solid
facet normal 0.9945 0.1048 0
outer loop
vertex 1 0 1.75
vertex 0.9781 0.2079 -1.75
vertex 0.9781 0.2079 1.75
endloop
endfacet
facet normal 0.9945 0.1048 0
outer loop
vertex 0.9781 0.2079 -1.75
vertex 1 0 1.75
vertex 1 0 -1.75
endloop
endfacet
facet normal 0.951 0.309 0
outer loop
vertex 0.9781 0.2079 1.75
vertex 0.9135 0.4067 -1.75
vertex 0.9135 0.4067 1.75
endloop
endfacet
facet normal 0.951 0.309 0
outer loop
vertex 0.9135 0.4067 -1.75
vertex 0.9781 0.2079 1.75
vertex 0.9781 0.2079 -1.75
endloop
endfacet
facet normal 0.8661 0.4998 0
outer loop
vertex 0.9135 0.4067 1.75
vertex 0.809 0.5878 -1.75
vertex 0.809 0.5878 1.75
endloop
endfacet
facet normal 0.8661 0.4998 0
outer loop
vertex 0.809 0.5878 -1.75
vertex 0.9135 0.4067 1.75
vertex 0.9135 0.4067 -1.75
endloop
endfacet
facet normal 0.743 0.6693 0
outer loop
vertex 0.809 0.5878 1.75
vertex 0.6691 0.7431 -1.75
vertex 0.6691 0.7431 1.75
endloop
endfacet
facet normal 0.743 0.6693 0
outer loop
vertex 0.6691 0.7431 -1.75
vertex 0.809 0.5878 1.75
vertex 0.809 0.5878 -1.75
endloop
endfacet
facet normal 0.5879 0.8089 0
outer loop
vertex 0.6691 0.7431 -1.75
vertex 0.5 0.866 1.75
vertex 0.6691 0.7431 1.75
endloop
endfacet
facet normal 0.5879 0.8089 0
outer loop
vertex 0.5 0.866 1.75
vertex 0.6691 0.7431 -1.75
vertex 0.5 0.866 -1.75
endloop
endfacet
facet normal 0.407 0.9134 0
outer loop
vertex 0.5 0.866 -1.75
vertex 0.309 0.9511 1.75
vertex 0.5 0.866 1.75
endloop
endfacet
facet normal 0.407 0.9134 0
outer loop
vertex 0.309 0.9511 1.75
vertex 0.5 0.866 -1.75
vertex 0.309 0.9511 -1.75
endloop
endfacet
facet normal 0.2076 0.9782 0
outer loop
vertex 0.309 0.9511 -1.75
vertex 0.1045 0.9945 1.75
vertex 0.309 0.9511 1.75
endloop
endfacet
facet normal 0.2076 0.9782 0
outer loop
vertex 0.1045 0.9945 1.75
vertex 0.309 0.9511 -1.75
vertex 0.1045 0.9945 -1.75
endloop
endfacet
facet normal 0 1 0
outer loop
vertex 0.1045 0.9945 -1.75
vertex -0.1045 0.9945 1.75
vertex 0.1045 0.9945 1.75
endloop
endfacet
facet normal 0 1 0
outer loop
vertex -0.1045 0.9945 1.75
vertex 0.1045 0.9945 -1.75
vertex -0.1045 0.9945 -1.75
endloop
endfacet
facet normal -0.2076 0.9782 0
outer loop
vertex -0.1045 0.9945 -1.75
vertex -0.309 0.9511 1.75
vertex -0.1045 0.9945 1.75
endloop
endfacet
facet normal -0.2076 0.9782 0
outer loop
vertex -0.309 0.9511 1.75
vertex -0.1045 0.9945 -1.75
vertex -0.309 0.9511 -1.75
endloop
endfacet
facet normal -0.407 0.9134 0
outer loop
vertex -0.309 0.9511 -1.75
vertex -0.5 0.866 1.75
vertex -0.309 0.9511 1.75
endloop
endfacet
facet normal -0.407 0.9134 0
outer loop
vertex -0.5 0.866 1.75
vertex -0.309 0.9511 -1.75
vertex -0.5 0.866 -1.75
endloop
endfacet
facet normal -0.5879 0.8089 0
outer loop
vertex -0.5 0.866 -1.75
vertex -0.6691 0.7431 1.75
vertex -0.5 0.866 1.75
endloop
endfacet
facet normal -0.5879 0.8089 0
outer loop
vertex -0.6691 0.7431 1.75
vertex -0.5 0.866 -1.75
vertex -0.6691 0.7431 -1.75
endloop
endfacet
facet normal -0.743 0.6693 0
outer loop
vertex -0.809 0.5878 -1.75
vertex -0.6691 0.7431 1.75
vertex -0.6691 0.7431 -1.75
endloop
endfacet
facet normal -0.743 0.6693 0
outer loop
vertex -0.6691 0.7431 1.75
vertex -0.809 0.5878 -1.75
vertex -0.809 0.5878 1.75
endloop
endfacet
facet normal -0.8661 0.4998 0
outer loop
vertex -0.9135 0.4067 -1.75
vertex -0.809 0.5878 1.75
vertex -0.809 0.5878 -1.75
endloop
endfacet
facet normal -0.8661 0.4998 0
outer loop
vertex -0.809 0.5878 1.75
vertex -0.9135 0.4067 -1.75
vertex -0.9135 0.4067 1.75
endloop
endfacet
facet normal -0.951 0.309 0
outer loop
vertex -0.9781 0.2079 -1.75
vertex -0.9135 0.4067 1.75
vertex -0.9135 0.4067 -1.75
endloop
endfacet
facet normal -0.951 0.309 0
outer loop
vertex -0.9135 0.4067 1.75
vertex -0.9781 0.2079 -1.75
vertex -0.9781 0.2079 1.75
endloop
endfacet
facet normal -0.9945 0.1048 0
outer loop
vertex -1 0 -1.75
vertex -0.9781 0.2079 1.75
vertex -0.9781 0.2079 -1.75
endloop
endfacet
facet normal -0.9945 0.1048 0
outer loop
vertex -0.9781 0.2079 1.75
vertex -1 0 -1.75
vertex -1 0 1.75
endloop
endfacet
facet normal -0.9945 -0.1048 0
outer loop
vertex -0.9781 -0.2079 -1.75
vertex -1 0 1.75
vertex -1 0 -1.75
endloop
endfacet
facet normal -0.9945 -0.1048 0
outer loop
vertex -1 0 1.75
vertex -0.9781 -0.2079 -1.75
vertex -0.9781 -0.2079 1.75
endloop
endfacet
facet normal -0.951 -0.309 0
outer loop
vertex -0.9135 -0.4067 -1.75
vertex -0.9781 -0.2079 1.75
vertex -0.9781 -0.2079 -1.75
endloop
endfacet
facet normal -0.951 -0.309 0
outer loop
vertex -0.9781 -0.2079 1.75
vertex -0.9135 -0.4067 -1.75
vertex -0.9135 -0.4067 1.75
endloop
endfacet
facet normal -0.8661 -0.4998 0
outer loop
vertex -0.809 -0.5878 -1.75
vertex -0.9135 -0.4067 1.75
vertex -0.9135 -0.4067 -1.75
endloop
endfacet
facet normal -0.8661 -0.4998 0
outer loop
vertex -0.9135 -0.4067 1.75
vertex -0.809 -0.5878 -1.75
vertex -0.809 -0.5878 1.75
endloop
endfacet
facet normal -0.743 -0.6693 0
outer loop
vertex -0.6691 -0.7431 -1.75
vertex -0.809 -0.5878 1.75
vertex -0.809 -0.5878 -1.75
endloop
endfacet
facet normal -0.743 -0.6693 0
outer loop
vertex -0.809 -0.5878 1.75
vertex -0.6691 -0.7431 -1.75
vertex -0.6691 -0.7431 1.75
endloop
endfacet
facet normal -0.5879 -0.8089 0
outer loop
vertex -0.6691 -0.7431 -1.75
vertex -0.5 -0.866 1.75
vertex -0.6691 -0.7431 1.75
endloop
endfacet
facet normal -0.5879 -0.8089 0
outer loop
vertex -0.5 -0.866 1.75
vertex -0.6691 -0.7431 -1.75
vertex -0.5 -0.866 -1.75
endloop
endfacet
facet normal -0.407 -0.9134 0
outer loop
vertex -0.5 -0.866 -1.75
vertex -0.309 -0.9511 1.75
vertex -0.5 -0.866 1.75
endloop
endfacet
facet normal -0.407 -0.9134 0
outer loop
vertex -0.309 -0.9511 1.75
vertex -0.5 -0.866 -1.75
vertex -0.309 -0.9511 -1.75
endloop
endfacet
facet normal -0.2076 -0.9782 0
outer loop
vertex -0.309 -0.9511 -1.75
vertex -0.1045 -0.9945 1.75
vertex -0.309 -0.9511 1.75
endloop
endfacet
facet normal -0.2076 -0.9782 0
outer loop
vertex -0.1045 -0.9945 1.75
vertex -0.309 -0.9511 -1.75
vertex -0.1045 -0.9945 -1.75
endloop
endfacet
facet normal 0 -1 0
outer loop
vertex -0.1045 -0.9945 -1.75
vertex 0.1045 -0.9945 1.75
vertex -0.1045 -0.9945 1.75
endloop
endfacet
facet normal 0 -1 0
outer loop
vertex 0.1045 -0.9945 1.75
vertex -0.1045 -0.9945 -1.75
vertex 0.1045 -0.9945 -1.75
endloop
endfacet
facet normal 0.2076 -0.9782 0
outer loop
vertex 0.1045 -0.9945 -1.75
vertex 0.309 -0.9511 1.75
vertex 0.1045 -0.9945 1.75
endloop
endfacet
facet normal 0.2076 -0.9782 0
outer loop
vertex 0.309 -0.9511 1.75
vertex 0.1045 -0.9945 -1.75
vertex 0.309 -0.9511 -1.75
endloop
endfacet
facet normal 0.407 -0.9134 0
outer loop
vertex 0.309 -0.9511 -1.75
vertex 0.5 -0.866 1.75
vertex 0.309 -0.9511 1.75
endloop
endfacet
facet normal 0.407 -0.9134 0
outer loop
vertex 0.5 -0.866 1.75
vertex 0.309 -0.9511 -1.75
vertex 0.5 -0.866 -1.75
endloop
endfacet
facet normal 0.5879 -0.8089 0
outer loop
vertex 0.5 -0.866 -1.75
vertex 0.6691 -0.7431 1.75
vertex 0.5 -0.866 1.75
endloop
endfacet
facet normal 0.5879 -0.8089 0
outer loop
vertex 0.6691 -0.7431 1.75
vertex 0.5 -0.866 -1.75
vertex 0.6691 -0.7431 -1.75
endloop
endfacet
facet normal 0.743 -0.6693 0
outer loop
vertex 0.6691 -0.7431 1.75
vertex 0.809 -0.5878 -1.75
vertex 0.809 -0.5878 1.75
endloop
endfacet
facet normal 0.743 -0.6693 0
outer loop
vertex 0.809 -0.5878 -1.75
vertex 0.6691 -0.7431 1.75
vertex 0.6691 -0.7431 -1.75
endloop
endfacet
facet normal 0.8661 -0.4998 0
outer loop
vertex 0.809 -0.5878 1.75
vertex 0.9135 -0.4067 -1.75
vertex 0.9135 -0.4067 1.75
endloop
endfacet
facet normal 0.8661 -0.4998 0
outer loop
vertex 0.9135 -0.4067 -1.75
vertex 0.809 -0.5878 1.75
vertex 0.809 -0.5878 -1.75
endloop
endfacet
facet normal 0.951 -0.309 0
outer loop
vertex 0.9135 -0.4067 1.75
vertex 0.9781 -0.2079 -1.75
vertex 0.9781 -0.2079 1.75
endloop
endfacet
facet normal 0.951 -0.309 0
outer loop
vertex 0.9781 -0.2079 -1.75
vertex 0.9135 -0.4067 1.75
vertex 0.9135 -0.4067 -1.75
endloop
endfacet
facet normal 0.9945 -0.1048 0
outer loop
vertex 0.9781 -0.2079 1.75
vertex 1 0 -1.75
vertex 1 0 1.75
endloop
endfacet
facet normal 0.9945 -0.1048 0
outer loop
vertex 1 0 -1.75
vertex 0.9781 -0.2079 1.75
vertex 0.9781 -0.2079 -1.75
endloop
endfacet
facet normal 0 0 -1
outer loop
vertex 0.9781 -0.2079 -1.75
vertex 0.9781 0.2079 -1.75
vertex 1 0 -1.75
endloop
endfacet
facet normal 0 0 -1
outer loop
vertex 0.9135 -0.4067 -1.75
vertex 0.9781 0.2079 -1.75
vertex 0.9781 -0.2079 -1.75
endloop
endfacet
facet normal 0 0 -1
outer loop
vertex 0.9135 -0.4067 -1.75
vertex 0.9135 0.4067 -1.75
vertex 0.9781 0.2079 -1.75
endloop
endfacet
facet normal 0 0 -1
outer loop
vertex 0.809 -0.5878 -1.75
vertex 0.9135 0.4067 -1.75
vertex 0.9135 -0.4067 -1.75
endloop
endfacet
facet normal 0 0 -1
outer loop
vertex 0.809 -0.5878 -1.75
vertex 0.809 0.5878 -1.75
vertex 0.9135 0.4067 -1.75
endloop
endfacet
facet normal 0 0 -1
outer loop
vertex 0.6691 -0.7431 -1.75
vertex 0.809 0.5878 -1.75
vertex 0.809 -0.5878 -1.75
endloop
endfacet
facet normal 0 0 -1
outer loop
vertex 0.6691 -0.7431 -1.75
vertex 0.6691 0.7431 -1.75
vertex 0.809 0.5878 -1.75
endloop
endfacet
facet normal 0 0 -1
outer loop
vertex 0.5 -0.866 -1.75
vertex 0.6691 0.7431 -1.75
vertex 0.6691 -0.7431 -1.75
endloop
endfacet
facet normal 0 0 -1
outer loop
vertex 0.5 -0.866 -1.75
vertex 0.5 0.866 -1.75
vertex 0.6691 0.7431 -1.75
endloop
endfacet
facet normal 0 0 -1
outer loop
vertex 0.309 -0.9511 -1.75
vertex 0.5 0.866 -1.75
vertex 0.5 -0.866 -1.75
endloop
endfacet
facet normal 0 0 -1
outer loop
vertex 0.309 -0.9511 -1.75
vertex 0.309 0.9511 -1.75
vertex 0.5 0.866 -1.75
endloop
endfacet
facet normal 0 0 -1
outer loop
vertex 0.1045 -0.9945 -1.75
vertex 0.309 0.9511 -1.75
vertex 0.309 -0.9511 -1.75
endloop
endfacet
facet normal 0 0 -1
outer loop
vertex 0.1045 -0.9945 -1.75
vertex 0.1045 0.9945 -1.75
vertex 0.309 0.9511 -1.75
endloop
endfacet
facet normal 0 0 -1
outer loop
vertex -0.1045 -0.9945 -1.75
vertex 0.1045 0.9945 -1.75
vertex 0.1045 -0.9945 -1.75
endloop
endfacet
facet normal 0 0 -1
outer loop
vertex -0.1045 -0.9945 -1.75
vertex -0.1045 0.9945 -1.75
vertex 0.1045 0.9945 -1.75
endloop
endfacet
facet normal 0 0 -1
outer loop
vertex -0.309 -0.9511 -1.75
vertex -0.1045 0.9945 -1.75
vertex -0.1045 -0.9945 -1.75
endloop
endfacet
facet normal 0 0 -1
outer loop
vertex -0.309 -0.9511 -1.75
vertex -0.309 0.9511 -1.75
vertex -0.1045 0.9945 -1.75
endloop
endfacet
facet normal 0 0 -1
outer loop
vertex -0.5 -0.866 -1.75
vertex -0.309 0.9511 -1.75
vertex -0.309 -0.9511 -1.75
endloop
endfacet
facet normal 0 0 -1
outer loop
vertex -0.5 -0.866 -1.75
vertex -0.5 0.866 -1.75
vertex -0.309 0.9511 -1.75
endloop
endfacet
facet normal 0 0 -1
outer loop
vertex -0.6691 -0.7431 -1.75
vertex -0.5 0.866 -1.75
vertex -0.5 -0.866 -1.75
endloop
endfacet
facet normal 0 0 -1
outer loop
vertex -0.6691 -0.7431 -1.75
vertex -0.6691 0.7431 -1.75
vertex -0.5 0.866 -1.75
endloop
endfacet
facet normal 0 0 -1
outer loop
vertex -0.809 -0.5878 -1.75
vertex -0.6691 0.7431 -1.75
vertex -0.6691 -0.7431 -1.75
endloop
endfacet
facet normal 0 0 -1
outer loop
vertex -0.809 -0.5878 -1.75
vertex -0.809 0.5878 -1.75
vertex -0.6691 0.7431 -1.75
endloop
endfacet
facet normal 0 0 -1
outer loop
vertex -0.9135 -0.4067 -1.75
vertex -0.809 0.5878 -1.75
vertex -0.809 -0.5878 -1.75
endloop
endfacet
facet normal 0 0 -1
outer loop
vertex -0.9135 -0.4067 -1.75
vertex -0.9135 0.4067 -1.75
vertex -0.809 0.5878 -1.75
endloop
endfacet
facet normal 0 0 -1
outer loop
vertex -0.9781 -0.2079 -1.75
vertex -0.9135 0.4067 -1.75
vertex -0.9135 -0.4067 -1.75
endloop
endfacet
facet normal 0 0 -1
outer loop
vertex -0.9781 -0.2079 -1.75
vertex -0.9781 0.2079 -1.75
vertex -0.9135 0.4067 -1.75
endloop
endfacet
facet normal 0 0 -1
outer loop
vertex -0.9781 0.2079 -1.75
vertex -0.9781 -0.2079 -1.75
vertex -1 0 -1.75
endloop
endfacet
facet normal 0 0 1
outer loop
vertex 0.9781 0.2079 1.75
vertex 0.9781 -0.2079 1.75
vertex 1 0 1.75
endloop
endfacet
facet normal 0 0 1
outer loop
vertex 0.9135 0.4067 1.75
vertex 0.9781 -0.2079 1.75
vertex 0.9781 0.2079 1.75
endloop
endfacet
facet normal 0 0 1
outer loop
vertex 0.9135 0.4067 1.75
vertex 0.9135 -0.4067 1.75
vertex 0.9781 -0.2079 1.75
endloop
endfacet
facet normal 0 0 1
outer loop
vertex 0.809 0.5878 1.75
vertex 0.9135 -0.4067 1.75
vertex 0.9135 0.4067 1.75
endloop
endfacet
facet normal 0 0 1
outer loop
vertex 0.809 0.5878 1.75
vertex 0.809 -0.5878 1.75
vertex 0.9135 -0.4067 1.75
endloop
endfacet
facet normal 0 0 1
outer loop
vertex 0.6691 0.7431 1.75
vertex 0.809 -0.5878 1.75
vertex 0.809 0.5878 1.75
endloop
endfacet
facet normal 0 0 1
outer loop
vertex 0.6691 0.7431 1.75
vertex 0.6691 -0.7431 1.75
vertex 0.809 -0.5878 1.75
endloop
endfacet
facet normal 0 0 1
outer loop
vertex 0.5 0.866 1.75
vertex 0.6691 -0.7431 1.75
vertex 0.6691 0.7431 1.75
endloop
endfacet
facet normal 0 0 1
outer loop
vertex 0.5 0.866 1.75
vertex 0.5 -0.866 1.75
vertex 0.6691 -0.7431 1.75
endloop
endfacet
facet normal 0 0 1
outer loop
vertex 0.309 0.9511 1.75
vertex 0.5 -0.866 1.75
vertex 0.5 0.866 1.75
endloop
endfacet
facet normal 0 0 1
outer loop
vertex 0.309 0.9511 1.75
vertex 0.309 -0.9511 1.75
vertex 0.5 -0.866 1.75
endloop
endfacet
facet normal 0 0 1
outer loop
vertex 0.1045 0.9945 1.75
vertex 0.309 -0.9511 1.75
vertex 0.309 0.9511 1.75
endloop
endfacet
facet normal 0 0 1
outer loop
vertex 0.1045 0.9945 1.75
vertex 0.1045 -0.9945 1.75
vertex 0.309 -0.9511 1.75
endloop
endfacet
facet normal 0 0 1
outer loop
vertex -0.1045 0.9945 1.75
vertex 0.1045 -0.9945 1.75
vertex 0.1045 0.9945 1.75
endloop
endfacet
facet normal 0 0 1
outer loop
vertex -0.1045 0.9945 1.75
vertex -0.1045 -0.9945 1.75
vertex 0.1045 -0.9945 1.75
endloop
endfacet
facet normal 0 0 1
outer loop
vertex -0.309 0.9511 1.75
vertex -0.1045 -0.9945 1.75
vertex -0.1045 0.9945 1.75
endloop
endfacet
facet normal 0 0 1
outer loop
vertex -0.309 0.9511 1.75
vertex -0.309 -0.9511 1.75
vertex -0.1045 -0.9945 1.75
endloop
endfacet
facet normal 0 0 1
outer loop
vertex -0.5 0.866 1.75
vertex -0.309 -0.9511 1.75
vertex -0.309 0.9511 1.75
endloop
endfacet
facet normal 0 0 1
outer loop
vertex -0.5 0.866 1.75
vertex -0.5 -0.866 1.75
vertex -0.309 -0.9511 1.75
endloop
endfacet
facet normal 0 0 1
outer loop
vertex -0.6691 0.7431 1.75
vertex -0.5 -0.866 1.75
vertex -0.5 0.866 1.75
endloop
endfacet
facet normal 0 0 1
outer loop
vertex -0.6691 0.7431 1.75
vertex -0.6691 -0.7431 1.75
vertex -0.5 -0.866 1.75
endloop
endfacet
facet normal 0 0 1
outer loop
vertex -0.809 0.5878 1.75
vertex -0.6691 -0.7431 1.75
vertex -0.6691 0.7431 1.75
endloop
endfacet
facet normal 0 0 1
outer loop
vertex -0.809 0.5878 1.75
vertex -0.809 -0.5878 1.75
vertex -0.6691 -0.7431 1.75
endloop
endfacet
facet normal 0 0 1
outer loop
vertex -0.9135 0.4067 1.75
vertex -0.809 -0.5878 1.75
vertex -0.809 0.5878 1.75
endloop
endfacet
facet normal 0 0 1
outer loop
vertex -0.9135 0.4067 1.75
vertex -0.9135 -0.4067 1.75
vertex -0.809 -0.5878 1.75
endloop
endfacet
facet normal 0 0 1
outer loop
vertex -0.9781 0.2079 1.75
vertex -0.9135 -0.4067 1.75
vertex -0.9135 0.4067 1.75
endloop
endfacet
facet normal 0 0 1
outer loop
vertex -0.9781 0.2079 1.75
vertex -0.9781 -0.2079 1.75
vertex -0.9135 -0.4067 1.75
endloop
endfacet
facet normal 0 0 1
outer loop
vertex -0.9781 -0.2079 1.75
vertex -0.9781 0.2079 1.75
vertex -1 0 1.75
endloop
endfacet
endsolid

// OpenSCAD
// part_id: b9
// name: B9 pin
// source_drawing_ids: DRW-002
// units: mm
// revision: 0.1
// SPDX-License-Identifier: MIT

module part_b9(pin_d = 2.0, pin_h = 3.5) {
    cylinder(d = pin_d, h = pin_h, center = true, $fn = 30);
}

// ---- "main guard" ----
// Default to previewing when opened directly:
if (is_undef(__LIB_MODE__)) {
    part_b9();
}
